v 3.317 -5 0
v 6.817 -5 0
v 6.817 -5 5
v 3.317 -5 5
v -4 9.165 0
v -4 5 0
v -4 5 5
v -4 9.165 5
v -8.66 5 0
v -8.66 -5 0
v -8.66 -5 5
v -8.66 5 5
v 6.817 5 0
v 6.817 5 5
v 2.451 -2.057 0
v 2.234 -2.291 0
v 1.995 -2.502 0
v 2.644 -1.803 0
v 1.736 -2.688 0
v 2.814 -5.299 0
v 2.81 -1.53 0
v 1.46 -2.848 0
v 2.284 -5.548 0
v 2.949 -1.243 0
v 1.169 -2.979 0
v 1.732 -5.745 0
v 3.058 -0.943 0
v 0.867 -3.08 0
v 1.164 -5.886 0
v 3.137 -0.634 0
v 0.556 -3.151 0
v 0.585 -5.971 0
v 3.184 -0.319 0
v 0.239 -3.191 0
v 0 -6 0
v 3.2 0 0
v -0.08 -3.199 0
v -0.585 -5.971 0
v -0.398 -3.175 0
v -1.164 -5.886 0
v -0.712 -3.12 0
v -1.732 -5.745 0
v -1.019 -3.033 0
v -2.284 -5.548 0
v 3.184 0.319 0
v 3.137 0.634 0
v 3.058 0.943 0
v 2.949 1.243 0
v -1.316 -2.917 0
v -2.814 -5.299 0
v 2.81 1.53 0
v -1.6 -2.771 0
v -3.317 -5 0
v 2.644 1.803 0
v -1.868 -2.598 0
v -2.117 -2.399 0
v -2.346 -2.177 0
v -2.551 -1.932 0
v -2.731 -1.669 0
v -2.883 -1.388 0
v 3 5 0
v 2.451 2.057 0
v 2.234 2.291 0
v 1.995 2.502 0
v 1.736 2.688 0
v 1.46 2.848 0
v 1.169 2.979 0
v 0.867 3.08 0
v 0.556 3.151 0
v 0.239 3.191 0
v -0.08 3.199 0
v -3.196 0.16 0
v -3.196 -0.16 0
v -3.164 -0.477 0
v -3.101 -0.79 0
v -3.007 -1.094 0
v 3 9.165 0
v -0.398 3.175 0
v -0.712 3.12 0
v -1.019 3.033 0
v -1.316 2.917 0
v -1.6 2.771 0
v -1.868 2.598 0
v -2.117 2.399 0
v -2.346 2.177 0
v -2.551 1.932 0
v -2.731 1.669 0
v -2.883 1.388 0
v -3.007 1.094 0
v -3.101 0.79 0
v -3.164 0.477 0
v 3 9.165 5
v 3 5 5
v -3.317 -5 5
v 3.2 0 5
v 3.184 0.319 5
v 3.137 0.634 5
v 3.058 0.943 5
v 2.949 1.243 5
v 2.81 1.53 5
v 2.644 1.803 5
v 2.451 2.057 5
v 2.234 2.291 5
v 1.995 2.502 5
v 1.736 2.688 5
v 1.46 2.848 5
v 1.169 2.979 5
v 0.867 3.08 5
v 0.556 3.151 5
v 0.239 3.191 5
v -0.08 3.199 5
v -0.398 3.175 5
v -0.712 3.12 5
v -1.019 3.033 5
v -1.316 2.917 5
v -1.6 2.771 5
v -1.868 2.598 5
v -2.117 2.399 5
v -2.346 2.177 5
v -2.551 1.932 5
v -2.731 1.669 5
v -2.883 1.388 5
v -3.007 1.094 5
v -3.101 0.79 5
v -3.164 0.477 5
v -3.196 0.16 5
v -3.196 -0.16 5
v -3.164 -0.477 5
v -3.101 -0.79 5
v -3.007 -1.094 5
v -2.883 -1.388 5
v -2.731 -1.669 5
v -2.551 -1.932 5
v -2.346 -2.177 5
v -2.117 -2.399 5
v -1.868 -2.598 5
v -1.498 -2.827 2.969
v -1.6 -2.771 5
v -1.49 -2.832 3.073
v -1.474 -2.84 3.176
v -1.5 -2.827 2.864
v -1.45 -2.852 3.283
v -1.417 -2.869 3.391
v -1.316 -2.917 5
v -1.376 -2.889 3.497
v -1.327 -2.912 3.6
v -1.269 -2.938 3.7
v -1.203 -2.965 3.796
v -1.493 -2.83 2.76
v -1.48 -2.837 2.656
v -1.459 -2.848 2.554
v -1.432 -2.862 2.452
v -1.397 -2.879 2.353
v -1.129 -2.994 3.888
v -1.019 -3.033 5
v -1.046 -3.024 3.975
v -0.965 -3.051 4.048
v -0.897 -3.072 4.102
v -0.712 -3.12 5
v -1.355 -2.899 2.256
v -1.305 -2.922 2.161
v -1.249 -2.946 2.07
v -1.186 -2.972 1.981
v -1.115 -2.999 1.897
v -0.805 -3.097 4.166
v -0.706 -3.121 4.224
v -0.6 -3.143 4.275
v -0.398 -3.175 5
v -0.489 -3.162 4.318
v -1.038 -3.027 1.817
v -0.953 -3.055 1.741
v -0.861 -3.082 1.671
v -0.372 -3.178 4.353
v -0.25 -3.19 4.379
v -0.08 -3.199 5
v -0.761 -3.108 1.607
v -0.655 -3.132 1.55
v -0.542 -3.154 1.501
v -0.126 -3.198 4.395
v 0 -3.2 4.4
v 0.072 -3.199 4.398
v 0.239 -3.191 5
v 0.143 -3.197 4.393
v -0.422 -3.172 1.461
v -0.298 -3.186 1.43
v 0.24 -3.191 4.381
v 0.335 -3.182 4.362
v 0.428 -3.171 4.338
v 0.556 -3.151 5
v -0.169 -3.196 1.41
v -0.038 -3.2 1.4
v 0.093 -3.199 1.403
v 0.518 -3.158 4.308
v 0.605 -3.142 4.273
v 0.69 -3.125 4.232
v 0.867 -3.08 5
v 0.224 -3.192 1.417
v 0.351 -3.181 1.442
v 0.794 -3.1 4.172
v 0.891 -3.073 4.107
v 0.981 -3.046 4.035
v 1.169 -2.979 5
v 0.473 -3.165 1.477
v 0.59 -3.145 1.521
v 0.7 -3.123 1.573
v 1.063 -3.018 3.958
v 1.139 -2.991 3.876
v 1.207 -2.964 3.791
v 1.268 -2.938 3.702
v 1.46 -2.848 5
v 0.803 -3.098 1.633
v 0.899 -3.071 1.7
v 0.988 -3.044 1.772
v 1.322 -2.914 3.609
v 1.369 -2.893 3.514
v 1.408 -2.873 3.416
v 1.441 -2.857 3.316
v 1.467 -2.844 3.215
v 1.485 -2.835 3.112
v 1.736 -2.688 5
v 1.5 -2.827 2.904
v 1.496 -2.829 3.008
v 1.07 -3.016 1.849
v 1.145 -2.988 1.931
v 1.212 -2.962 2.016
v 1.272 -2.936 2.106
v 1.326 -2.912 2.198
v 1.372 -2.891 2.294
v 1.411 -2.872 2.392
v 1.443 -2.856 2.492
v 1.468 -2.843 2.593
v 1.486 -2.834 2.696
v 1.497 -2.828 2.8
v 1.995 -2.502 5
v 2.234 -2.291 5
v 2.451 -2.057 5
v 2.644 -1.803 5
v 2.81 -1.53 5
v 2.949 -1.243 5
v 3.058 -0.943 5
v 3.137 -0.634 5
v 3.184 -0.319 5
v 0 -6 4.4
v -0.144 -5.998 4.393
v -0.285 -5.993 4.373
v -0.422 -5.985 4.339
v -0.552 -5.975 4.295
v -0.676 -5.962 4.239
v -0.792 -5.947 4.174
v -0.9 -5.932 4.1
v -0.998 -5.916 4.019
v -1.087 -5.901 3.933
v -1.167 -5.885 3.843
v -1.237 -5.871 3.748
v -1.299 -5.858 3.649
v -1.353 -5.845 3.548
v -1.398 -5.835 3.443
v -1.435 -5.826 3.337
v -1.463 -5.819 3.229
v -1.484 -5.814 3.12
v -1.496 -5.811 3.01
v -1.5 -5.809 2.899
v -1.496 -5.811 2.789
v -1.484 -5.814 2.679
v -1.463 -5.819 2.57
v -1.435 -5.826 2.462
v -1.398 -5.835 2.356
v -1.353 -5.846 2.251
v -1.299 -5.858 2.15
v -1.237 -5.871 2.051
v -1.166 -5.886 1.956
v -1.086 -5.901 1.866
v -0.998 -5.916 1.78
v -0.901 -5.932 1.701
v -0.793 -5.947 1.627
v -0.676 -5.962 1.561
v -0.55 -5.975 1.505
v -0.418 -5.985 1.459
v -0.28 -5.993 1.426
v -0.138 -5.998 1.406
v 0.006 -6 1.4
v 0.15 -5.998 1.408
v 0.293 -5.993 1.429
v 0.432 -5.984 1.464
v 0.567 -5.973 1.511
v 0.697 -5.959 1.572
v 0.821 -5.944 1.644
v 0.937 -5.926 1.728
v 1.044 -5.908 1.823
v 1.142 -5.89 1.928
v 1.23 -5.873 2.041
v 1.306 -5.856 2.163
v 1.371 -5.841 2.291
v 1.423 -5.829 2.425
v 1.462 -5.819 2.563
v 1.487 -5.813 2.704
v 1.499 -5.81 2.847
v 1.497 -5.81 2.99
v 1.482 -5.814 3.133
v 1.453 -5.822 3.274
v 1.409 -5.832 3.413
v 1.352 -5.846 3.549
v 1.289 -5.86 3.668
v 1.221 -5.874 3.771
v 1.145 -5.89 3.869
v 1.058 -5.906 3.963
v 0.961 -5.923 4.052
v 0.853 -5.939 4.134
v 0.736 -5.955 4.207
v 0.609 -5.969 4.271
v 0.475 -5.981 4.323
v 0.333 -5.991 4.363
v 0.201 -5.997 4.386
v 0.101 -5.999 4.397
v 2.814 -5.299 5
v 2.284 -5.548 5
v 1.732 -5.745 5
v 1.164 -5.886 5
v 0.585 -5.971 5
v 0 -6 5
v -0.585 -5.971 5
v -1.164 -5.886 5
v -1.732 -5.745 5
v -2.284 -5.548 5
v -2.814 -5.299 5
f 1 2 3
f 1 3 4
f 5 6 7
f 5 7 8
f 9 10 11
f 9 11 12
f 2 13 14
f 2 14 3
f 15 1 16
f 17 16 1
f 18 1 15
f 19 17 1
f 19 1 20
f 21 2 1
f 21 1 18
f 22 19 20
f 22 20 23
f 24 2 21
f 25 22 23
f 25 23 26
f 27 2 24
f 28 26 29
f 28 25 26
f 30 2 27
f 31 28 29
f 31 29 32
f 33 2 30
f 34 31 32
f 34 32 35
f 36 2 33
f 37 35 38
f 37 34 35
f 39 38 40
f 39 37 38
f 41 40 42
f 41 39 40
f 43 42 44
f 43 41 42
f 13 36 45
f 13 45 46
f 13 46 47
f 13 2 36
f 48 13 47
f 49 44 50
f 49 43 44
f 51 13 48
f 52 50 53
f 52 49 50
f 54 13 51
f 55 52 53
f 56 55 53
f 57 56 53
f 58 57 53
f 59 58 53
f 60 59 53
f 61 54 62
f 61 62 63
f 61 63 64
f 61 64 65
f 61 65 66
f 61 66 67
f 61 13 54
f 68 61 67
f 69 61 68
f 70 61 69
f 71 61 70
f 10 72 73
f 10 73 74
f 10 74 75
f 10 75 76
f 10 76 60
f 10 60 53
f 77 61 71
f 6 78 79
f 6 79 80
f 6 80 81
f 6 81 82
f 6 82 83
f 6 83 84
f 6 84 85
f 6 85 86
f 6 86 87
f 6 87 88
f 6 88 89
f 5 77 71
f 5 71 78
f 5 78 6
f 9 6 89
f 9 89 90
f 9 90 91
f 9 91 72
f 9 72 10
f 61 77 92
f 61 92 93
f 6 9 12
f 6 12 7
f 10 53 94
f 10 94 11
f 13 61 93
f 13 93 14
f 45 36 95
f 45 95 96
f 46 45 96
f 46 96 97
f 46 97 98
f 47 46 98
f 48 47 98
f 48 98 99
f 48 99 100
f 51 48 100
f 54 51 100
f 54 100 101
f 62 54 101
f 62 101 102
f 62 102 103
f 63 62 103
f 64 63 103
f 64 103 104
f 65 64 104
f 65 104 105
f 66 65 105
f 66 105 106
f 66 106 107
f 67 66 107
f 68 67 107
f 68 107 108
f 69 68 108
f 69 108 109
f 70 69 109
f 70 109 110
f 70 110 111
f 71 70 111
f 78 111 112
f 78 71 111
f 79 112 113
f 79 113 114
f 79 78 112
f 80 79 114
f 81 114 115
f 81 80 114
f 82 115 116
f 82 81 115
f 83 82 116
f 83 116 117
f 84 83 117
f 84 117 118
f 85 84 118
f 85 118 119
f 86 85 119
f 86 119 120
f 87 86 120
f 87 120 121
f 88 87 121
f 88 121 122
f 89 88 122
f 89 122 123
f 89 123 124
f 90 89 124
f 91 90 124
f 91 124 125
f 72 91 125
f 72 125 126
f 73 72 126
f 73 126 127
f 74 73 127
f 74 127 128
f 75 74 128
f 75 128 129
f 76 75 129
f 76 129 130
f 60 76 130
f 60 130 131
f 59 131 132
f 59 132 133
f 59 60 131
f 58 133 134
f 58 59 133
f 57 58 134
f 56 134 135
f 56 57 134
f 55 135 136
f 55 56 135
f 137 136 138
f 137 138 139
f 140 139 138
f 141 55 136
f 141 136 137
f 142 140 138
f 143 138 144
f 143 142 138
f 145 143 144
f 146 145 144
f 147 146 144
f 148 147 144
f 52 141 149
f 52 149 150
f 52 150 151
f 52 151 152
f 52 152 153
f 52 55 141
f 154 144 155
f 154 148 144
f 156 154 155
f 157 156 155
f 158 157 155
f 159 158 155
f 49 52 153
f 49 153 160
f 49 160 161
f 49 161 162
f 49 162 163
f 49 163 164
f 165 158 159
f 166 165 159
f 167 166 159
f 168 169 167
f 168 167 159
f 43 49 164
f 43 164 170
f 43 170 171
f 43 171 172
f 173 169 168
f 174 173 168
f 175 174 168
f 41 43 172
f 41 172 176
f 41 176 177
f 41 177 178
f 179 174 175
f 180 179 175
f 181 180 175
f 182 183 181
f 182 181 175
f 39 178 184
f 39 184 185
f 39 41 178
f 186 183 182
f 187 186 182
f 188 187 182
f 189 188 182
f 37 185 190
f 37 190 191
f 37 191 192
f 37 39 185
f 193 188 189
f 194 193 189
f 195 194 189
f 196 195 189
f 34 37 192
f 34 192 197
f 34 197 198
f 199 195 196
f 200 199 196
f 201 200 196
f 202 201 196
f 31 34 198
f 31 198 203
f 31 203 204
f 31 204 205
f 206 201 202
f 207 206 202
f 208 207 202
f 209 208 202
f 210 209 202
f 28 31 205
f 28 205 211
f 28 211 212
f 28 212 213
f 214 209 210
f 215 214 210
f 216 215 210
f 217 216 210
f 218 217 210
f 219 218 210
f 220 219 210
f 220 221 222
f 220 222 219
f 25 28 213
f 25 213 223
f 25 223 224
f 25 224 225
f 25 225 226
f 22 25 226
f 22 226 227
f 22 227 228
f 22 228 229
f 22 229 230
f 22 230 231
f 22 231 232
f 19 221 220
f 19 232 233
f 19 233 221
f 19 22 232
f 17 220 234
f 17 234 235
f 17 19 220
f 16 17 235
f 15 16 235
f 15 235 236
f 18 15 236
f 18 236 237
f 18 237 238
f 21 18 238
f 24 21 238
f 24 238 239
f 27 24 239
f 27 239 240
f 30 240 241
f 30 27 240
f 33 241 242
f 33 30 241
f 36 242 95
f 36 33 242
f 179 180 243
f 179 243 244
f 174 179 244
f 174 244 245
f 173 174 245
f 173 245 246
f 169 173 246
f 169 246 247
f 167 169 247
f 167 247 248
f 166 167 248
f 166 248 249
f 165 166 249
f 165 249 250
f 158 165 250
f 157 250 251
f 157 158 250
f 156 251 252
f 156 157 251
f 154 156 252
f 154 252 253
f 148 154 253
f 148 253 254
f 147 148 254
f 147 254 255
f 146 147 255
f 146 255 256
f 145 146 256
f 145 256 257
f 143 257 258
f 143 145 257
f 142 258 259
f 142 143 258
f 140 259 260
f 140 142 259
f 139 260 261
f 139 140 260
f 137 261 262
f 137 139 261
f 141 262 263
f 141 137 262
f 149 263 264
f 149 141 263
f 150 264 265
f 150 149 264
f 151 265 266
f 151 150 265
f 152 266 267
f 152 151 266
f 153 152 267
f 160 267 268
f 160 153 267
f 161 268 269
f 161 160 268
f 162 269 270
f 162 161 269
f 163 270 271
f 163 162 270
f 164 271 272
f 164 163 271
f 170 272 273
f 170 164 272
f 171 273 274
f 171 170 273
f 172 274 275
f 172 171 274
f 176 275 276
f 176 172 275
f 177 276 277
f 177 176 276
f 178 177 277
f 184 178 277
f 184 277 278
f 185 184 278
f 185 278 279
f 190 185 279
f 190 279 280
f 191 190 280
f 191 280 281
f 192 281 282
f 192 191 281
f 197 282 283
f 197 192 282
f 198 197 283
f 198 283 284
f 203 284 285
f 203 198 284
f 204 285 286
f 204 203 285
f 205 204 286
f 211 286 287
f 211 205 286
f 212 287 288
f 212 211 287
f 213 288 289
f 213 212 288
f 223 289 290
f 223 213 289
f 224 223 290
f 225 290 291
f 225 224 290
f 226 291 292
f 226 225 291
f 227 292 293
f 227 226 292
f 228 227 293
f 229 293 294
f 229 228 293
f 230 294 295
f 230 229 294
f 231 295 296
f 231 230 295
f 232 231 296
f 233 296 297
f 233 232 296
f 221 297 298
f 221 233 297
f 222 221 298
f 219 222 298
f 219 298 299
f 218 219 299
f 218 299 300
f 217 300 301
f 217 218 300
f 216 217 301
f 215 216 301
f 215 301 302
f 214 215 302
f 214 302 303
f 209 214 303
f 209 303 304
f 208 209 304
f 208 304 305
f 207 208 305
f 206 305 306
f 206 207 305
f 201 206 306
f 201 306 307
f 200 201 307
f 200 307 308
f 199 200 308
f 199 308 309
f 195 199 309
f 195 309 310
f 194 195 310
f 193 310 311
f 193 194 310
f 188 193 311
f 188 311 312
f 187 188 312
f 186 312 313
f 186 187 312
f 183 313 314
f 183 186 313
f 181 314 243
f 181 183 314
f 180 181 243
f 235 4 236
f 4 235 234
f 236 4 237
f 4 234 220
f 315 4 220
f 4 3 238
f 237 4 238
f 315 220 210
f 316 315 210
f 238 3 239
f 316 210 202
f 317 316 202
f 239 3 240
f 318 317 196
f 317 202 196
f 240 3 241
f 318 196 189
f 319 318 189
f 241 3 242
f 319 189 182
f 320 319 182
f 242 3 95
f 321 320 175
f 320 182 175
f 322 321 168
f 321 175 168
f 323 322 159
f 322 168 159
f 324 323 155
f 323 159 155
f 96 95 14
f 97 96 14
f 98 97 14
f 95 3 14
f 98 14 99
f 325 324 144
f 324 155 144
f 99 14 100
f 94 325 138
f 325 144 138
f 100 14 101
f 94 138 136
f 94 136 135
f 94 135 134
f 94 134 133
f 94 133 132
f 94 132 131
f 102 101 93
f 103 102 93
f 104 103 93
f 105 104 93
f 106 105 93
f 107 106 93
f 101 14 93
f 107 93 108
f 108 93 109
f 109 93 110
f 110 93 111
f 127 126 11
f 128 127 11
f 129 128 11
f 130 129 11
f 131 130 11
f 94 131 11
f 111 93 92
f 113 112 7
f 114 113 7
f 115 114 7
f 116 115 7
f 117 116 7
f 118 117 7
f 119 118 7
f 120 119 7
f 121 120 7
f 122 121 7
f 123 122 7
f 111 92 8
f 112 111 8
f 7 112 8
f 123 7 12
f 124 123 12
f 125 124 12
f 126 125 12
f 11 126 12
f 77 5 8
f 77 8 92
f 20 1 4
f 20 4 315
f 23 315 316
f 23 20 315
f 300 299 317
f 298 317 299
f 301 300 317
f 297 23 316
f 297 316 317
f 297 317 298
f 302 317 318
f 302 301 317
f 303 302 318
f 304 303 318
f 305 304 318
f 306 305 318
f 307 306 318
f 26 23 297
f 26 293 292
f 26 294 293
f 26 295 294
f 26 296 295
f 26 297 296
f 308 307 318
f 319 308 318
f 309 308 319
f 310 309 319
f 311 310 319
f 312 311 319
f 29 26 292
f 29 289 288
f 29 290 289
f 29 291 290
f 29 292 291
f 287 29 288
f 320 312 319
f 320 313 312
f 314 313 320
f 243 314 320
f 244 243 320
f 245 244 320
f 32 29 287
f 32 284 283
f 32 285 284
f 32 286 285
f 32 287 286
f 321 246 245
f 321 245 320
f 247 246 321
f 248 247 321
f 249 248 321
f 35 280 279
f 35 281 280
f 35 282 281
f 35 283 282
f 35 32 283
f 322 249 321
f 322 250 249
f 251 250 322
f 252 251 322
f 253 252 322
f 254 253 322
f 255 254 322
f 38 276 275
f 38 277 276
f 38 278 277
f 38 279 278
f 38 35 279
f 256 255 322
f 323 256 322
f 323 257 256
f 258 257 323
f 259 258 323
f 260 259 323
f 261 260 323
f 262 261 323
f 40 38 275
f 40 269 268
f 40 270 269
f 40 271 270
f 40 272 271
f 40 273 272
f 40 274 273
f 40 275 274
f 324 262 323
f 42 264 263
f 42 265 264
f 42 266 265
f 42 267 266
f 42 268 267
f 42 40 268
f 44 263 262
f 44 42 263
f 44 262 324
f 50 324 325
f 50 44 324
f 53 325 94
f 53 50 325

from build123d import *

# Parameters (mm, degrees)
SKETCH_1_R               = 3.2
EXTRUDE_1_DEPTH          = 5
CUT_EXTRUDE_1_DEPTH      = 5
CUT_EXTRUDE_1_DEPTH_BACK = 5
SKETCH_2_R               = 1.5


with BuildPart() as part:
    # 草图1 → 凸台-拉伸1 (new body)
    with BuildSketch(Plane.XY):
        with BuildLine():
            Line((-3.31662479, -5), (-8.660254038, -5))
            Line((-8.660254038, -5), (-8.660254038, 5))
            Line((-8.660254038, 5), (-4, 5))
            Line((-4, 5), (-4, 9.16515139))
            Line((-4, 9.16515139), (3, 9.16515139))
            Line((3, 9.16515139), (3, 5))
            Line((3, 5), (6.81662479, 5))
            Line((6.81662479, 5), (6.81662479, -5))
            Line((6.81662479, -5), (3.31662479, -5))
            ThreePointArc((3.31662479, -5), (0, -6), (-3.31662479, -5))
        make_face()
        Circle(SKETCH_1_R, mode=Mode.SUBTRACT)
    extrude(amount=EXTRUDE_1_DEPTH)

    # 草图2 → 切除-拉伸1 (cut, two sides: drawn at the far end of the back side and taken through both)
    with BuildSketch(Plane.XZ.offset(5).offset(-CUT_EXTRUDE_1_DEPTH_BACK)):
        with Locations((0, 2.9)):
            Circle(SKETCH_2_R)
    extrude(amount=CUT_EXTRUDE_1_DEPTH + CUT_EXTRUDE_1_DEPTH_BACK, mode=Mode.SUBTRACT)


solid = part.part
